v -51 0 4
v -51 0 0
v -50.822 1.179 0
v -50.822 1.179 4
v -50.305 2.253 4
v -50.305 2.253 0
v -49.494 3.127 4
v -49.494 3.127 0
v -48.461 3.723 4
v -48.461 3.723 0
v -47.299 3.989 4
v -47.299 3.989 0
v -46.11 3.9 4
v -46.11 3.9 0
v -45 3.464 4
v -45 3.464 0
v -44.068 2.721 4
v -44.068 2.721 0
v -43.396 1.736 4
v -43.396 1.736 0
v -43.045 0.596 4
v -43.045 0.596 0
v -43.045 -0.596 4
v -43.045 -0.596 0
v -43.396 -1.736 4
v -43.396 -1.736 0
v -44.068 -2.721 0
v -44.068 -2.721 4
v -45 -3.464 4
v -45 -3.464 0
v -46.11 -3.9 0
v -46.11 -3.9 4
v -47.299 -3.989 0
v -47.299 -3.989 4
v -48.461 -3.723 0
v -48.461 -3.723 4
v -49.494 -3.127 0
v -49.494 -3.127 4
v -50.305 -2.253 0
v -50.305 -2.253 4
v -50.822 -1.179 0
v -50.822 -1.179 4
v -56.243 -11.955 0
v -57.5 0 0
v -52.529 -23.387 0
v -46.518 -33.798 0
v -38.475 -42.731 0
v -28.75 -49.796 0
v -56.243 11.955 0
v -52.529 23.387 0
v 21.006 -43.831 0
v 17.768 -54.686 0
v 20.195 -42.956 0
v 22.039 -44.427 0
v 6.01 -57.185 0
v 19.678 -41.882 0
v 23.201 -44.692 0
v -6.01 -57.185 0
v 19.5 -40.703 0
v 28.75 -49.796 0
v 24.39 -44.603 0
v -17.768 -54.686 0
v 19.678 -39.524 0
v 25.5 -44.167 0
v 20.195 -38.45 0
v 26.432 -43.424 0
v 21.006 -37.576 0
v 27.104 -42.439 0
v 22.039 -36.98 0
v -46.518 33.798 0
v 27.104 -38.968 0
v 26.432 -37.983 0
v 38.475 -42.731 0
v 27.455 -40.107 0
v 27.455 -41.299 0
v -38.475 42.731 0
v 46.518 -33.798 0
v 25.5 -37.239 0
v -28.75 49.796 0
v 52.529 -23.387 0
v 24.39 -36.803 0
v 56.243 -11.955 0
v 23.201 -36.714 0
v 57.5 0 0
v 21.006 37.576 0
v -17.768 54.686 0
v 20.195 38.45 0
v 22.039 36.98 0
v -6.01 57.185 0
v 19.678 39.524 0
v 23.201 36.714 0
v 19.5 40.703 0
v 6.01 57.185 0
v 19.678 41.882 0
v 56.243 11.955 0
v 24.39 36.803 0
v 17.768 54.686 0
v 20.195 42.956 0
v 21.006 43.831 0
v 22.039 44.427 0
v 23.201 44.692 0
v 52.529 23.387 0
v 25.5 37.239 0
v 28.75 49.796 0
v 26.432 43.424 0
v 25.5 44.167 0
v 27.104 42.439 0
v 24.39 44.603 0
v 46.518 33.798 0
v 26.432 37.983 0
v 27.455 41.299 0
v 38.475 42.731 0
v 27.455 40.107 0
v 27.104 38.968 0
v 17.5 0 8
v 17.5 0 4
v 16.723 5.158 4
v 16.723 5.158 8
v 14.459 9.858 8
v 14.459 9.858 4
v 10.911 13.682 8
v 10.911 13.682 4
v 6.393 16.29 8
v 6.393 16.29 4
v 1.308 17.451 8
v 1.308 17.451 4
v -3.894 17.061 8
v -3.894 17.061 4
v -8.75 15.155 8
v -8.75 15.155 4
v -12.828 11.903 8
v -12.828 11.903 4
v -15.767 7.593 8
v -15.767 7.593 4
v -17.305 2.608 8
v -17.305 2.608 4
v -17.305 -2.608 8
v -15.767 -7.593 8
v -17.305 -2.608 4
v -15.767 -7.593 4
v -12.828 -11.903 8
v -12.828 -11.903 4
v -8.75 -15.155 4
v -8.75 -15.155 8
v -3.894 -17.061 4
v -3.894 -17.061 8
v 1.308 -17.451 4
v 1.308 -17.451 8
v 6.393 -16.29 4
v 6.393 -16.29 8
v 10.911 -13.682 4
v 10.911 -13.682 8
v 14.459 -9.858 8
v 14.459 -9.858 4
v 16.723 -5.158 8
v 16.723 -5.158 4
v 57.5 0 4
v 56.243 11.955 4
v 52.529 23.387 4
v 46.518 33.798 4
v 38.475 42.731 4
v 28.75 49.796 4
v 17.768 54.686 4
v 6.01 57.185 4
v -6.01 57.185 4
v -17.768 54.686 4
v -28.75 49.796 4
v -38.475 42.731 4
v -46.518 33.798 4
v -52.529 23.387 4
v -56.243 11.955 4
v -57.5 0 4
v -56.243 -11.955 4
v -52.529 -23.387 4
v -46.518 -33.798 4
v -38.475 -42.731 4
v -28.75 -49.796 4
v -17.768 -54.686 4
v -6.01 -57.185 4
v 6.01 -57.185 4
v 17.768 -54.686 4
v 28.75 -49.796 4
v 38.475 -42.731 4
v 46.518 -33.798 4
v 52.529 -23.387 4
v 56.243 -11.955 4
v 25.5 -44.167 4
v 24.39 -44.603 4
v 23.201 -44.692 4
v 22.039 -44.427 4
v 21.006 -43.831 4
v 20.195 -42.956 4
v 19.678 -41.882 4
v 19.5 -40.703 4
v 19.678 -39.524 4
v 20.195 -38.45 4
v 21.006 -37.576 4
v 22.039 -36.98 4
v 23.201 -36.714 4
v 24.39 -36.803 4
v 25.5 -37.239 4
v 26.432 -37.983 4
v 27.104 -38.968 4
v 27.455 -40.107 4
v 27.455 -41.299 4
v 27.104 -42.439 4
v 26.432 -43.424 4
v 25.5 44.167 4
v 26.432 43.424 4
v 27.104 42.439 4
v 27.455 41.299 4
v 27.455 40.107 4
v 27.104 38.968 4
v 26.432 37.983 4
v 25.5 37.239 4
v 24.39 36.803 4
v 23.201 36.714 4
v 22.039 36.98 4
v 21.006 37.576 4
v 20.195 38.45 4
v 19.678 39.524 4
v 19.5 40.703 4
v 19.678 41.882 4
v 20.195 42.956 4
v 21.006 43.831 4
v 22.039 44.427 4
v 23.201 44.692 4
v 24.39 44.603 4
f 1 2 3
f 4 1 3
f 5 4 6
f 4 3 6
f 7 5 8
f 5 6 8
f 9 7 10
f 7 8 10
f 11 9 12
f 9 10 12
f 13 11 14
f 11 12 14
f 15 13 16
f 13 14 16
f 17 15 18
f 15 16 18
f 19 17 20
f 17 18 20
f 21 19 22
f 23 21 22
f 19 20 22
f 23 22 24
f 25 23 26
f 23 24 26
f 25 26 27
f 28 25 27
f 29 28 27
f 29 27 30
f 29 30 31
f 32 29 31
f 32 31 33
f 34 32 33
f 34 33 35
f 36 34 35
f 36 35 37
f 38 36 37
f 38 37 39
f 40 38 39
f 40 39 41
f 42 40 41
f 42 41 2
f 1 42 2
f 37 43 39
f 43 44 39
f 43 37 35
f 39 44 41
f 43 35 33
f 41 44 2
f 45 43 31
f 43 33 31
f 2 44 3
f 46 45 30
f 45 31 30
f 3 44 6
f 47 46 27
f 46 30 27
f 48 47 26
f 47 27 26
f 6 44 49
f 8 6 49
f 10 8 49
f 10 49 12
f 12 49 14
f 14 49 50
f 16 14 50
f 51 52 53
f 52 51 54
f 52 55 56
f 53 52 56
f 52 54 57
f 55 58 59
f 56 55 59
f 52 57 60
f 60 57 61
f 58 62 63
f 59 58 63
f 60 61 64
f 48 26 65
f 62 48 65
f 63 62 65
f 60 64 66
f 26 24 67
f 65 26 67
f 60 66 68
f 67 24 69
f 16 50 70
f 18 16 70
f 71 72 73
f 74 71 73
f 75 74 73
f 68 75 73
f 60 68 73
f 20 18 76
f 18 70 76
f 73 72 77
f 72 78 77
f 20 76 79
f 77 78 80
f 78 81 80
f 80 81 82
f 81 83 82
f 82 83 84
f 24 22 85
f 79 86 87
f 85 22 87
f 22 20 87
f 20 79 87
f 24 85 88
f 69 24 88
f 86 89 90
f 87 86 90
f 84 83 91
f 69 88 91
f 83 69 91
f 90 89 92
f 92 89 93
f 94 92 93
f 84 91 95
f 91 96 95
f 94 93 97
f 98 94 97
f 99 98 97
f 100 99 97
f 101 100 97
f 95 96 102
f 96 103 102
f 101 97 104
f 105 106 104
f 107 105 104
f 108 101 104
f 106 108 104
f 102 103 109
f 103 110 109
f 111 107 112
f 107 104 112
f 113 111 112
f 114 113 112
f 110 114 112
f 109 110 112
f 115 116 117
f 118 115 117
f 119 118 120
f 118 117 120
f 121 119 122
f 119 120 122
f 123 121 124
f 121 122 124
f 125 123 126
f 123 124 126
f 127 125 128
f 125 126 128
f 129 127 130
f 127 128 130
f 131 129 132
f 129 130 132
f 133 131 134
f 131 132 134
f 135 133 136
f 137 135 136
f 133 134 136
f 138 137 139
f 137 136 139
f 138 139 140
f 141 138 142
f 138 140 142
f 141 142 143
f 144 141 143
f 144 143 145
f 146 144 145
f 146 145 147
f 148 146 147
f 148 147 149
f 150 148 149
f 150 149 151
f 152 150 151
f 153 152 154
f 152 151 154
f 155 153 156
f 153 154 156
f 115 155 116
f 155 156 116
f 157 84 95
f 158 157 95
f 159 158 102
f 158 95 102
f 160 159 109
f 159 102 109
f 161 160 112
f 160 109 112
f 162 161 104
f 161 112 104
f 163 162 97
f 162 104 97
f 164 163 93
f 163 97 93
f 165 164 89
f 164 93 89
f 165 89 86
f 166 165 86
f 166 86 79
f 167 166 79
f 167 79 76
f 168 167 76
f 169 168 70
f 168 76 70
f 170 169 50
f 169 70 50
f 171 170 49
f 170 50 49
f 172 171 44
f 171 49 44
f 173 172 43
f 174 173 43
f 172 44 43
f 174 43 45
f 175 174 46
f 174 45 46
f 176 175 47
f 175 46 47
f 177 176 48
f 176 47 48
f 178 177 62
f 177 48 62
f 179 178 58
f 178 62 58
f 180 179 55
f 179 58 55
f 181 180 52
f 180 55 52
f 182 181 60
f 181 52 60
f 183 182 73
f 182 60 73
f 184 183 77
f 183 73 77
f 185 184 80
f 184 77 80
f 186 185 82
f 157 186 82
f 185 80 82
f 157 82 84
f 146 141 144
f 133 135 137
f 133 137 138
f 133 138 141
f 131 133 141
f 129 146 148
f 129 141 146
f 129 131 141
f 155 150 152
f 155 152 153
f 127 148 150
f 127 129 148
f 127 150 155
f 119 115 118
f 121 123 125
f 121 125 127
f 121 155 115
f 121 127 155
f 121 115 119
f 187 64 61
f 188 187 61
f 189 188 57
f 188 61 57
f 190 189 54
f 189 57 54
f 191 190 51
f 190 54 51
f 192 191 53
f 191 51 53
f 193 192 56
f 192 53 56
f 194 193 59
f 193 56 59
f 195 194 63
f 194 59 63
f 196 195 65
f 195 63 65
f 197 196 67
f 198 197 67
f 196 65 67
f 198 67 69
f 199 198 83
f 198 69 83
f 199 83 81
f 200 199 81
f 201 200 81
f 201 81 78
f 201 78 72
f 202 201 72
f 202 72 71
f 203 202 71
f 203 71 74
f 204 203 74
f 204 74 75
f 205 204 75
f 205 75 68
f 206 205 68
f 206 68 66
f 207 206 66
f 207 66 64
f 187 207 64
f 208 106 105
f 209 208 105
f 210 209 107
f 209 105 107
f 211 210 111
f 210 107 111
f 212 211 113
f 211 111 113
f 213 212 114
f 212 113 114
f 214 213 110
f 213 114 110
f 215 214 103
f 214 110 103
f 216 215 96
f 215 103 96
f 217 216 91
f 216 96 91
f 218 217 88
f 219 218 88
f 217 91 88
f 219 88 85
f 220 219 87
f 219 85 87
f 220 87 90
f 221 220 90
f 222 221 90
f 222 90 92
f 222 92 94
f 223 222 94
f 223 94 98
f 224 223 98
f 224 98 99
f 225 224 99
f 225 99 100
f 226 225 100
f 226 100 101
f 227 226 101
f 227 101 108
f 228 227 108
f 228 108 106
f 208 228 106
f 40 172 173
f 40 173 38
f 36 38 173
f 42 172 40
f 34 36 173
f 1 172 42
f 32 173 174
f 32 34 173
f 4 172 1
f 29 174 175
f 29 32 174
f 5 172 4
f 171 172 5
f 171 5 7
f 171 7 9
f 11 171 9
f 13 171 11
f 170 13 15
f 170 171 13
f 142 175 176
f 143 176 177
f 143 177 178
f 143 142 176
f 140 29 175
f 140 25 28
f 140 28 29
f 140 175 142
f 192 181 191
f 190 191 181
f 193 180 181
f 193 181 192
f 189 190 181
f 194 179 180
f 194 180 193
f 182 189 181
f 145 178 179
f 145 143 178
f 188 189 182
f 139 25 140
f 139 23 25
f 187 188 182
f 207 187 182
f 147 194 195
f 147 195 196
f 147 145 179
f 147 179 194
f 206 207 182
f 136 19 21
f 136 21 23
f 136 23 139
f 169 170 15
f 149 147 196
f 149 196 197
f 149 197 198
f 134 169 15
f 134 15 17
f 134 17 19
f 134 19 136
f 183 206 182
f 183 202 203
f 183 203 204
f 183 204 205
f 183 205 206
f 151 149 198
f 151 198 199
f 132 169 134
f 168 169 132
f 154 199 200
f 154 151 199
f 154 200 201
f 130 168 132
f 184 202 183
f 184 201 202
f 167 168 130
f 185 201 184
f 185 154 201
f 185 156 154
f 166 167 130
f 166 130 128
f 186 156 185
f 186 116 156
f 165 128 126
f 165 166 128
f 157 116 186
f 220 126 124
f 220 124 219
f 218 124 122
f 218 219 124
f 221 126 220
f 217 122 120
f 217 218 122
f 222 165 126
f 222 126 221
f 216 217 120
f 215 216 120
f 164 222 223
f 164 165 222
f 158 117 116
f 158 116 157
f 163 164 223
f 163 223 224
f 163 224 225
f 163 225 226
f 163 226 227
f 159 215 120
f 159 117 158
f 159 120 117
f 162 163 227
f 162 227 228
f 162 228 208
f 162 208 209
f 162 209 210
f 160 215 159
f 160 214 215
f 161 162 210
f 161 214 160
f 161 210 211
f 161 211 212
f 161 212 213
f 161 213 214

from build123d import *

# Parameters (mm, degrees)
SKETCH_1_R               = 57.5
EXTRUDE_1_DEPTH          = 4
SKETCH_2_R               = 17.5
EXTRUDE_2_DEPTH          = 4
SKETCH_3_R               = 4
CUT_EXTRUDE_1_DEPTH      = 12
PATTERN_CIRCULAR_1_COUNT = 3


with BuildPart() as part:
    # 草图1 → 凸台-拉伸1 (new body)
    with BuildSketch(Plane.XY):
        Circle(SKETCH_1_R)
    extrude(amount=EXTRUDE_1_DEPTH)

    # 草图2 → 凸台-拉伸2 (add)
    with BuildSketch(Plane.XY.offset(4)):
        Circle(SKETCH_2_R)
    extrude(amount=EXTRUDE_2_DEPTH)

    # 草图3 → 切除-拉伸1 (cut)
    with BuildSketch(Plane(origin=(0, 0, 0), x_dir=(-1, 0, 0), z_dir=(0, 0, -1))):
        with Locations((47, 0)):
            Circle(SKETCH_3_R)
    cut_extrude_1 = extrude(amount=-CUT_EXTRUDE_1_DEPTH, mode=Mode.SUBTRACT)

    # 阵列(圆周)1: 切除-拉伸1 ×3 about axis
    pattern_circular_1_axis = Axis((0, 0, 0), (0, 0, 1))
    for i in range(1, PATTERN_CIRCULAR_1_COUNT):
        add(cut_extrude_1.rotate(pattern_circular_1_axis, i * 360 / PATTERN_CIRCULAR_1_COUNT), mode=Mode.SUBTRACT)


solid = part.part
